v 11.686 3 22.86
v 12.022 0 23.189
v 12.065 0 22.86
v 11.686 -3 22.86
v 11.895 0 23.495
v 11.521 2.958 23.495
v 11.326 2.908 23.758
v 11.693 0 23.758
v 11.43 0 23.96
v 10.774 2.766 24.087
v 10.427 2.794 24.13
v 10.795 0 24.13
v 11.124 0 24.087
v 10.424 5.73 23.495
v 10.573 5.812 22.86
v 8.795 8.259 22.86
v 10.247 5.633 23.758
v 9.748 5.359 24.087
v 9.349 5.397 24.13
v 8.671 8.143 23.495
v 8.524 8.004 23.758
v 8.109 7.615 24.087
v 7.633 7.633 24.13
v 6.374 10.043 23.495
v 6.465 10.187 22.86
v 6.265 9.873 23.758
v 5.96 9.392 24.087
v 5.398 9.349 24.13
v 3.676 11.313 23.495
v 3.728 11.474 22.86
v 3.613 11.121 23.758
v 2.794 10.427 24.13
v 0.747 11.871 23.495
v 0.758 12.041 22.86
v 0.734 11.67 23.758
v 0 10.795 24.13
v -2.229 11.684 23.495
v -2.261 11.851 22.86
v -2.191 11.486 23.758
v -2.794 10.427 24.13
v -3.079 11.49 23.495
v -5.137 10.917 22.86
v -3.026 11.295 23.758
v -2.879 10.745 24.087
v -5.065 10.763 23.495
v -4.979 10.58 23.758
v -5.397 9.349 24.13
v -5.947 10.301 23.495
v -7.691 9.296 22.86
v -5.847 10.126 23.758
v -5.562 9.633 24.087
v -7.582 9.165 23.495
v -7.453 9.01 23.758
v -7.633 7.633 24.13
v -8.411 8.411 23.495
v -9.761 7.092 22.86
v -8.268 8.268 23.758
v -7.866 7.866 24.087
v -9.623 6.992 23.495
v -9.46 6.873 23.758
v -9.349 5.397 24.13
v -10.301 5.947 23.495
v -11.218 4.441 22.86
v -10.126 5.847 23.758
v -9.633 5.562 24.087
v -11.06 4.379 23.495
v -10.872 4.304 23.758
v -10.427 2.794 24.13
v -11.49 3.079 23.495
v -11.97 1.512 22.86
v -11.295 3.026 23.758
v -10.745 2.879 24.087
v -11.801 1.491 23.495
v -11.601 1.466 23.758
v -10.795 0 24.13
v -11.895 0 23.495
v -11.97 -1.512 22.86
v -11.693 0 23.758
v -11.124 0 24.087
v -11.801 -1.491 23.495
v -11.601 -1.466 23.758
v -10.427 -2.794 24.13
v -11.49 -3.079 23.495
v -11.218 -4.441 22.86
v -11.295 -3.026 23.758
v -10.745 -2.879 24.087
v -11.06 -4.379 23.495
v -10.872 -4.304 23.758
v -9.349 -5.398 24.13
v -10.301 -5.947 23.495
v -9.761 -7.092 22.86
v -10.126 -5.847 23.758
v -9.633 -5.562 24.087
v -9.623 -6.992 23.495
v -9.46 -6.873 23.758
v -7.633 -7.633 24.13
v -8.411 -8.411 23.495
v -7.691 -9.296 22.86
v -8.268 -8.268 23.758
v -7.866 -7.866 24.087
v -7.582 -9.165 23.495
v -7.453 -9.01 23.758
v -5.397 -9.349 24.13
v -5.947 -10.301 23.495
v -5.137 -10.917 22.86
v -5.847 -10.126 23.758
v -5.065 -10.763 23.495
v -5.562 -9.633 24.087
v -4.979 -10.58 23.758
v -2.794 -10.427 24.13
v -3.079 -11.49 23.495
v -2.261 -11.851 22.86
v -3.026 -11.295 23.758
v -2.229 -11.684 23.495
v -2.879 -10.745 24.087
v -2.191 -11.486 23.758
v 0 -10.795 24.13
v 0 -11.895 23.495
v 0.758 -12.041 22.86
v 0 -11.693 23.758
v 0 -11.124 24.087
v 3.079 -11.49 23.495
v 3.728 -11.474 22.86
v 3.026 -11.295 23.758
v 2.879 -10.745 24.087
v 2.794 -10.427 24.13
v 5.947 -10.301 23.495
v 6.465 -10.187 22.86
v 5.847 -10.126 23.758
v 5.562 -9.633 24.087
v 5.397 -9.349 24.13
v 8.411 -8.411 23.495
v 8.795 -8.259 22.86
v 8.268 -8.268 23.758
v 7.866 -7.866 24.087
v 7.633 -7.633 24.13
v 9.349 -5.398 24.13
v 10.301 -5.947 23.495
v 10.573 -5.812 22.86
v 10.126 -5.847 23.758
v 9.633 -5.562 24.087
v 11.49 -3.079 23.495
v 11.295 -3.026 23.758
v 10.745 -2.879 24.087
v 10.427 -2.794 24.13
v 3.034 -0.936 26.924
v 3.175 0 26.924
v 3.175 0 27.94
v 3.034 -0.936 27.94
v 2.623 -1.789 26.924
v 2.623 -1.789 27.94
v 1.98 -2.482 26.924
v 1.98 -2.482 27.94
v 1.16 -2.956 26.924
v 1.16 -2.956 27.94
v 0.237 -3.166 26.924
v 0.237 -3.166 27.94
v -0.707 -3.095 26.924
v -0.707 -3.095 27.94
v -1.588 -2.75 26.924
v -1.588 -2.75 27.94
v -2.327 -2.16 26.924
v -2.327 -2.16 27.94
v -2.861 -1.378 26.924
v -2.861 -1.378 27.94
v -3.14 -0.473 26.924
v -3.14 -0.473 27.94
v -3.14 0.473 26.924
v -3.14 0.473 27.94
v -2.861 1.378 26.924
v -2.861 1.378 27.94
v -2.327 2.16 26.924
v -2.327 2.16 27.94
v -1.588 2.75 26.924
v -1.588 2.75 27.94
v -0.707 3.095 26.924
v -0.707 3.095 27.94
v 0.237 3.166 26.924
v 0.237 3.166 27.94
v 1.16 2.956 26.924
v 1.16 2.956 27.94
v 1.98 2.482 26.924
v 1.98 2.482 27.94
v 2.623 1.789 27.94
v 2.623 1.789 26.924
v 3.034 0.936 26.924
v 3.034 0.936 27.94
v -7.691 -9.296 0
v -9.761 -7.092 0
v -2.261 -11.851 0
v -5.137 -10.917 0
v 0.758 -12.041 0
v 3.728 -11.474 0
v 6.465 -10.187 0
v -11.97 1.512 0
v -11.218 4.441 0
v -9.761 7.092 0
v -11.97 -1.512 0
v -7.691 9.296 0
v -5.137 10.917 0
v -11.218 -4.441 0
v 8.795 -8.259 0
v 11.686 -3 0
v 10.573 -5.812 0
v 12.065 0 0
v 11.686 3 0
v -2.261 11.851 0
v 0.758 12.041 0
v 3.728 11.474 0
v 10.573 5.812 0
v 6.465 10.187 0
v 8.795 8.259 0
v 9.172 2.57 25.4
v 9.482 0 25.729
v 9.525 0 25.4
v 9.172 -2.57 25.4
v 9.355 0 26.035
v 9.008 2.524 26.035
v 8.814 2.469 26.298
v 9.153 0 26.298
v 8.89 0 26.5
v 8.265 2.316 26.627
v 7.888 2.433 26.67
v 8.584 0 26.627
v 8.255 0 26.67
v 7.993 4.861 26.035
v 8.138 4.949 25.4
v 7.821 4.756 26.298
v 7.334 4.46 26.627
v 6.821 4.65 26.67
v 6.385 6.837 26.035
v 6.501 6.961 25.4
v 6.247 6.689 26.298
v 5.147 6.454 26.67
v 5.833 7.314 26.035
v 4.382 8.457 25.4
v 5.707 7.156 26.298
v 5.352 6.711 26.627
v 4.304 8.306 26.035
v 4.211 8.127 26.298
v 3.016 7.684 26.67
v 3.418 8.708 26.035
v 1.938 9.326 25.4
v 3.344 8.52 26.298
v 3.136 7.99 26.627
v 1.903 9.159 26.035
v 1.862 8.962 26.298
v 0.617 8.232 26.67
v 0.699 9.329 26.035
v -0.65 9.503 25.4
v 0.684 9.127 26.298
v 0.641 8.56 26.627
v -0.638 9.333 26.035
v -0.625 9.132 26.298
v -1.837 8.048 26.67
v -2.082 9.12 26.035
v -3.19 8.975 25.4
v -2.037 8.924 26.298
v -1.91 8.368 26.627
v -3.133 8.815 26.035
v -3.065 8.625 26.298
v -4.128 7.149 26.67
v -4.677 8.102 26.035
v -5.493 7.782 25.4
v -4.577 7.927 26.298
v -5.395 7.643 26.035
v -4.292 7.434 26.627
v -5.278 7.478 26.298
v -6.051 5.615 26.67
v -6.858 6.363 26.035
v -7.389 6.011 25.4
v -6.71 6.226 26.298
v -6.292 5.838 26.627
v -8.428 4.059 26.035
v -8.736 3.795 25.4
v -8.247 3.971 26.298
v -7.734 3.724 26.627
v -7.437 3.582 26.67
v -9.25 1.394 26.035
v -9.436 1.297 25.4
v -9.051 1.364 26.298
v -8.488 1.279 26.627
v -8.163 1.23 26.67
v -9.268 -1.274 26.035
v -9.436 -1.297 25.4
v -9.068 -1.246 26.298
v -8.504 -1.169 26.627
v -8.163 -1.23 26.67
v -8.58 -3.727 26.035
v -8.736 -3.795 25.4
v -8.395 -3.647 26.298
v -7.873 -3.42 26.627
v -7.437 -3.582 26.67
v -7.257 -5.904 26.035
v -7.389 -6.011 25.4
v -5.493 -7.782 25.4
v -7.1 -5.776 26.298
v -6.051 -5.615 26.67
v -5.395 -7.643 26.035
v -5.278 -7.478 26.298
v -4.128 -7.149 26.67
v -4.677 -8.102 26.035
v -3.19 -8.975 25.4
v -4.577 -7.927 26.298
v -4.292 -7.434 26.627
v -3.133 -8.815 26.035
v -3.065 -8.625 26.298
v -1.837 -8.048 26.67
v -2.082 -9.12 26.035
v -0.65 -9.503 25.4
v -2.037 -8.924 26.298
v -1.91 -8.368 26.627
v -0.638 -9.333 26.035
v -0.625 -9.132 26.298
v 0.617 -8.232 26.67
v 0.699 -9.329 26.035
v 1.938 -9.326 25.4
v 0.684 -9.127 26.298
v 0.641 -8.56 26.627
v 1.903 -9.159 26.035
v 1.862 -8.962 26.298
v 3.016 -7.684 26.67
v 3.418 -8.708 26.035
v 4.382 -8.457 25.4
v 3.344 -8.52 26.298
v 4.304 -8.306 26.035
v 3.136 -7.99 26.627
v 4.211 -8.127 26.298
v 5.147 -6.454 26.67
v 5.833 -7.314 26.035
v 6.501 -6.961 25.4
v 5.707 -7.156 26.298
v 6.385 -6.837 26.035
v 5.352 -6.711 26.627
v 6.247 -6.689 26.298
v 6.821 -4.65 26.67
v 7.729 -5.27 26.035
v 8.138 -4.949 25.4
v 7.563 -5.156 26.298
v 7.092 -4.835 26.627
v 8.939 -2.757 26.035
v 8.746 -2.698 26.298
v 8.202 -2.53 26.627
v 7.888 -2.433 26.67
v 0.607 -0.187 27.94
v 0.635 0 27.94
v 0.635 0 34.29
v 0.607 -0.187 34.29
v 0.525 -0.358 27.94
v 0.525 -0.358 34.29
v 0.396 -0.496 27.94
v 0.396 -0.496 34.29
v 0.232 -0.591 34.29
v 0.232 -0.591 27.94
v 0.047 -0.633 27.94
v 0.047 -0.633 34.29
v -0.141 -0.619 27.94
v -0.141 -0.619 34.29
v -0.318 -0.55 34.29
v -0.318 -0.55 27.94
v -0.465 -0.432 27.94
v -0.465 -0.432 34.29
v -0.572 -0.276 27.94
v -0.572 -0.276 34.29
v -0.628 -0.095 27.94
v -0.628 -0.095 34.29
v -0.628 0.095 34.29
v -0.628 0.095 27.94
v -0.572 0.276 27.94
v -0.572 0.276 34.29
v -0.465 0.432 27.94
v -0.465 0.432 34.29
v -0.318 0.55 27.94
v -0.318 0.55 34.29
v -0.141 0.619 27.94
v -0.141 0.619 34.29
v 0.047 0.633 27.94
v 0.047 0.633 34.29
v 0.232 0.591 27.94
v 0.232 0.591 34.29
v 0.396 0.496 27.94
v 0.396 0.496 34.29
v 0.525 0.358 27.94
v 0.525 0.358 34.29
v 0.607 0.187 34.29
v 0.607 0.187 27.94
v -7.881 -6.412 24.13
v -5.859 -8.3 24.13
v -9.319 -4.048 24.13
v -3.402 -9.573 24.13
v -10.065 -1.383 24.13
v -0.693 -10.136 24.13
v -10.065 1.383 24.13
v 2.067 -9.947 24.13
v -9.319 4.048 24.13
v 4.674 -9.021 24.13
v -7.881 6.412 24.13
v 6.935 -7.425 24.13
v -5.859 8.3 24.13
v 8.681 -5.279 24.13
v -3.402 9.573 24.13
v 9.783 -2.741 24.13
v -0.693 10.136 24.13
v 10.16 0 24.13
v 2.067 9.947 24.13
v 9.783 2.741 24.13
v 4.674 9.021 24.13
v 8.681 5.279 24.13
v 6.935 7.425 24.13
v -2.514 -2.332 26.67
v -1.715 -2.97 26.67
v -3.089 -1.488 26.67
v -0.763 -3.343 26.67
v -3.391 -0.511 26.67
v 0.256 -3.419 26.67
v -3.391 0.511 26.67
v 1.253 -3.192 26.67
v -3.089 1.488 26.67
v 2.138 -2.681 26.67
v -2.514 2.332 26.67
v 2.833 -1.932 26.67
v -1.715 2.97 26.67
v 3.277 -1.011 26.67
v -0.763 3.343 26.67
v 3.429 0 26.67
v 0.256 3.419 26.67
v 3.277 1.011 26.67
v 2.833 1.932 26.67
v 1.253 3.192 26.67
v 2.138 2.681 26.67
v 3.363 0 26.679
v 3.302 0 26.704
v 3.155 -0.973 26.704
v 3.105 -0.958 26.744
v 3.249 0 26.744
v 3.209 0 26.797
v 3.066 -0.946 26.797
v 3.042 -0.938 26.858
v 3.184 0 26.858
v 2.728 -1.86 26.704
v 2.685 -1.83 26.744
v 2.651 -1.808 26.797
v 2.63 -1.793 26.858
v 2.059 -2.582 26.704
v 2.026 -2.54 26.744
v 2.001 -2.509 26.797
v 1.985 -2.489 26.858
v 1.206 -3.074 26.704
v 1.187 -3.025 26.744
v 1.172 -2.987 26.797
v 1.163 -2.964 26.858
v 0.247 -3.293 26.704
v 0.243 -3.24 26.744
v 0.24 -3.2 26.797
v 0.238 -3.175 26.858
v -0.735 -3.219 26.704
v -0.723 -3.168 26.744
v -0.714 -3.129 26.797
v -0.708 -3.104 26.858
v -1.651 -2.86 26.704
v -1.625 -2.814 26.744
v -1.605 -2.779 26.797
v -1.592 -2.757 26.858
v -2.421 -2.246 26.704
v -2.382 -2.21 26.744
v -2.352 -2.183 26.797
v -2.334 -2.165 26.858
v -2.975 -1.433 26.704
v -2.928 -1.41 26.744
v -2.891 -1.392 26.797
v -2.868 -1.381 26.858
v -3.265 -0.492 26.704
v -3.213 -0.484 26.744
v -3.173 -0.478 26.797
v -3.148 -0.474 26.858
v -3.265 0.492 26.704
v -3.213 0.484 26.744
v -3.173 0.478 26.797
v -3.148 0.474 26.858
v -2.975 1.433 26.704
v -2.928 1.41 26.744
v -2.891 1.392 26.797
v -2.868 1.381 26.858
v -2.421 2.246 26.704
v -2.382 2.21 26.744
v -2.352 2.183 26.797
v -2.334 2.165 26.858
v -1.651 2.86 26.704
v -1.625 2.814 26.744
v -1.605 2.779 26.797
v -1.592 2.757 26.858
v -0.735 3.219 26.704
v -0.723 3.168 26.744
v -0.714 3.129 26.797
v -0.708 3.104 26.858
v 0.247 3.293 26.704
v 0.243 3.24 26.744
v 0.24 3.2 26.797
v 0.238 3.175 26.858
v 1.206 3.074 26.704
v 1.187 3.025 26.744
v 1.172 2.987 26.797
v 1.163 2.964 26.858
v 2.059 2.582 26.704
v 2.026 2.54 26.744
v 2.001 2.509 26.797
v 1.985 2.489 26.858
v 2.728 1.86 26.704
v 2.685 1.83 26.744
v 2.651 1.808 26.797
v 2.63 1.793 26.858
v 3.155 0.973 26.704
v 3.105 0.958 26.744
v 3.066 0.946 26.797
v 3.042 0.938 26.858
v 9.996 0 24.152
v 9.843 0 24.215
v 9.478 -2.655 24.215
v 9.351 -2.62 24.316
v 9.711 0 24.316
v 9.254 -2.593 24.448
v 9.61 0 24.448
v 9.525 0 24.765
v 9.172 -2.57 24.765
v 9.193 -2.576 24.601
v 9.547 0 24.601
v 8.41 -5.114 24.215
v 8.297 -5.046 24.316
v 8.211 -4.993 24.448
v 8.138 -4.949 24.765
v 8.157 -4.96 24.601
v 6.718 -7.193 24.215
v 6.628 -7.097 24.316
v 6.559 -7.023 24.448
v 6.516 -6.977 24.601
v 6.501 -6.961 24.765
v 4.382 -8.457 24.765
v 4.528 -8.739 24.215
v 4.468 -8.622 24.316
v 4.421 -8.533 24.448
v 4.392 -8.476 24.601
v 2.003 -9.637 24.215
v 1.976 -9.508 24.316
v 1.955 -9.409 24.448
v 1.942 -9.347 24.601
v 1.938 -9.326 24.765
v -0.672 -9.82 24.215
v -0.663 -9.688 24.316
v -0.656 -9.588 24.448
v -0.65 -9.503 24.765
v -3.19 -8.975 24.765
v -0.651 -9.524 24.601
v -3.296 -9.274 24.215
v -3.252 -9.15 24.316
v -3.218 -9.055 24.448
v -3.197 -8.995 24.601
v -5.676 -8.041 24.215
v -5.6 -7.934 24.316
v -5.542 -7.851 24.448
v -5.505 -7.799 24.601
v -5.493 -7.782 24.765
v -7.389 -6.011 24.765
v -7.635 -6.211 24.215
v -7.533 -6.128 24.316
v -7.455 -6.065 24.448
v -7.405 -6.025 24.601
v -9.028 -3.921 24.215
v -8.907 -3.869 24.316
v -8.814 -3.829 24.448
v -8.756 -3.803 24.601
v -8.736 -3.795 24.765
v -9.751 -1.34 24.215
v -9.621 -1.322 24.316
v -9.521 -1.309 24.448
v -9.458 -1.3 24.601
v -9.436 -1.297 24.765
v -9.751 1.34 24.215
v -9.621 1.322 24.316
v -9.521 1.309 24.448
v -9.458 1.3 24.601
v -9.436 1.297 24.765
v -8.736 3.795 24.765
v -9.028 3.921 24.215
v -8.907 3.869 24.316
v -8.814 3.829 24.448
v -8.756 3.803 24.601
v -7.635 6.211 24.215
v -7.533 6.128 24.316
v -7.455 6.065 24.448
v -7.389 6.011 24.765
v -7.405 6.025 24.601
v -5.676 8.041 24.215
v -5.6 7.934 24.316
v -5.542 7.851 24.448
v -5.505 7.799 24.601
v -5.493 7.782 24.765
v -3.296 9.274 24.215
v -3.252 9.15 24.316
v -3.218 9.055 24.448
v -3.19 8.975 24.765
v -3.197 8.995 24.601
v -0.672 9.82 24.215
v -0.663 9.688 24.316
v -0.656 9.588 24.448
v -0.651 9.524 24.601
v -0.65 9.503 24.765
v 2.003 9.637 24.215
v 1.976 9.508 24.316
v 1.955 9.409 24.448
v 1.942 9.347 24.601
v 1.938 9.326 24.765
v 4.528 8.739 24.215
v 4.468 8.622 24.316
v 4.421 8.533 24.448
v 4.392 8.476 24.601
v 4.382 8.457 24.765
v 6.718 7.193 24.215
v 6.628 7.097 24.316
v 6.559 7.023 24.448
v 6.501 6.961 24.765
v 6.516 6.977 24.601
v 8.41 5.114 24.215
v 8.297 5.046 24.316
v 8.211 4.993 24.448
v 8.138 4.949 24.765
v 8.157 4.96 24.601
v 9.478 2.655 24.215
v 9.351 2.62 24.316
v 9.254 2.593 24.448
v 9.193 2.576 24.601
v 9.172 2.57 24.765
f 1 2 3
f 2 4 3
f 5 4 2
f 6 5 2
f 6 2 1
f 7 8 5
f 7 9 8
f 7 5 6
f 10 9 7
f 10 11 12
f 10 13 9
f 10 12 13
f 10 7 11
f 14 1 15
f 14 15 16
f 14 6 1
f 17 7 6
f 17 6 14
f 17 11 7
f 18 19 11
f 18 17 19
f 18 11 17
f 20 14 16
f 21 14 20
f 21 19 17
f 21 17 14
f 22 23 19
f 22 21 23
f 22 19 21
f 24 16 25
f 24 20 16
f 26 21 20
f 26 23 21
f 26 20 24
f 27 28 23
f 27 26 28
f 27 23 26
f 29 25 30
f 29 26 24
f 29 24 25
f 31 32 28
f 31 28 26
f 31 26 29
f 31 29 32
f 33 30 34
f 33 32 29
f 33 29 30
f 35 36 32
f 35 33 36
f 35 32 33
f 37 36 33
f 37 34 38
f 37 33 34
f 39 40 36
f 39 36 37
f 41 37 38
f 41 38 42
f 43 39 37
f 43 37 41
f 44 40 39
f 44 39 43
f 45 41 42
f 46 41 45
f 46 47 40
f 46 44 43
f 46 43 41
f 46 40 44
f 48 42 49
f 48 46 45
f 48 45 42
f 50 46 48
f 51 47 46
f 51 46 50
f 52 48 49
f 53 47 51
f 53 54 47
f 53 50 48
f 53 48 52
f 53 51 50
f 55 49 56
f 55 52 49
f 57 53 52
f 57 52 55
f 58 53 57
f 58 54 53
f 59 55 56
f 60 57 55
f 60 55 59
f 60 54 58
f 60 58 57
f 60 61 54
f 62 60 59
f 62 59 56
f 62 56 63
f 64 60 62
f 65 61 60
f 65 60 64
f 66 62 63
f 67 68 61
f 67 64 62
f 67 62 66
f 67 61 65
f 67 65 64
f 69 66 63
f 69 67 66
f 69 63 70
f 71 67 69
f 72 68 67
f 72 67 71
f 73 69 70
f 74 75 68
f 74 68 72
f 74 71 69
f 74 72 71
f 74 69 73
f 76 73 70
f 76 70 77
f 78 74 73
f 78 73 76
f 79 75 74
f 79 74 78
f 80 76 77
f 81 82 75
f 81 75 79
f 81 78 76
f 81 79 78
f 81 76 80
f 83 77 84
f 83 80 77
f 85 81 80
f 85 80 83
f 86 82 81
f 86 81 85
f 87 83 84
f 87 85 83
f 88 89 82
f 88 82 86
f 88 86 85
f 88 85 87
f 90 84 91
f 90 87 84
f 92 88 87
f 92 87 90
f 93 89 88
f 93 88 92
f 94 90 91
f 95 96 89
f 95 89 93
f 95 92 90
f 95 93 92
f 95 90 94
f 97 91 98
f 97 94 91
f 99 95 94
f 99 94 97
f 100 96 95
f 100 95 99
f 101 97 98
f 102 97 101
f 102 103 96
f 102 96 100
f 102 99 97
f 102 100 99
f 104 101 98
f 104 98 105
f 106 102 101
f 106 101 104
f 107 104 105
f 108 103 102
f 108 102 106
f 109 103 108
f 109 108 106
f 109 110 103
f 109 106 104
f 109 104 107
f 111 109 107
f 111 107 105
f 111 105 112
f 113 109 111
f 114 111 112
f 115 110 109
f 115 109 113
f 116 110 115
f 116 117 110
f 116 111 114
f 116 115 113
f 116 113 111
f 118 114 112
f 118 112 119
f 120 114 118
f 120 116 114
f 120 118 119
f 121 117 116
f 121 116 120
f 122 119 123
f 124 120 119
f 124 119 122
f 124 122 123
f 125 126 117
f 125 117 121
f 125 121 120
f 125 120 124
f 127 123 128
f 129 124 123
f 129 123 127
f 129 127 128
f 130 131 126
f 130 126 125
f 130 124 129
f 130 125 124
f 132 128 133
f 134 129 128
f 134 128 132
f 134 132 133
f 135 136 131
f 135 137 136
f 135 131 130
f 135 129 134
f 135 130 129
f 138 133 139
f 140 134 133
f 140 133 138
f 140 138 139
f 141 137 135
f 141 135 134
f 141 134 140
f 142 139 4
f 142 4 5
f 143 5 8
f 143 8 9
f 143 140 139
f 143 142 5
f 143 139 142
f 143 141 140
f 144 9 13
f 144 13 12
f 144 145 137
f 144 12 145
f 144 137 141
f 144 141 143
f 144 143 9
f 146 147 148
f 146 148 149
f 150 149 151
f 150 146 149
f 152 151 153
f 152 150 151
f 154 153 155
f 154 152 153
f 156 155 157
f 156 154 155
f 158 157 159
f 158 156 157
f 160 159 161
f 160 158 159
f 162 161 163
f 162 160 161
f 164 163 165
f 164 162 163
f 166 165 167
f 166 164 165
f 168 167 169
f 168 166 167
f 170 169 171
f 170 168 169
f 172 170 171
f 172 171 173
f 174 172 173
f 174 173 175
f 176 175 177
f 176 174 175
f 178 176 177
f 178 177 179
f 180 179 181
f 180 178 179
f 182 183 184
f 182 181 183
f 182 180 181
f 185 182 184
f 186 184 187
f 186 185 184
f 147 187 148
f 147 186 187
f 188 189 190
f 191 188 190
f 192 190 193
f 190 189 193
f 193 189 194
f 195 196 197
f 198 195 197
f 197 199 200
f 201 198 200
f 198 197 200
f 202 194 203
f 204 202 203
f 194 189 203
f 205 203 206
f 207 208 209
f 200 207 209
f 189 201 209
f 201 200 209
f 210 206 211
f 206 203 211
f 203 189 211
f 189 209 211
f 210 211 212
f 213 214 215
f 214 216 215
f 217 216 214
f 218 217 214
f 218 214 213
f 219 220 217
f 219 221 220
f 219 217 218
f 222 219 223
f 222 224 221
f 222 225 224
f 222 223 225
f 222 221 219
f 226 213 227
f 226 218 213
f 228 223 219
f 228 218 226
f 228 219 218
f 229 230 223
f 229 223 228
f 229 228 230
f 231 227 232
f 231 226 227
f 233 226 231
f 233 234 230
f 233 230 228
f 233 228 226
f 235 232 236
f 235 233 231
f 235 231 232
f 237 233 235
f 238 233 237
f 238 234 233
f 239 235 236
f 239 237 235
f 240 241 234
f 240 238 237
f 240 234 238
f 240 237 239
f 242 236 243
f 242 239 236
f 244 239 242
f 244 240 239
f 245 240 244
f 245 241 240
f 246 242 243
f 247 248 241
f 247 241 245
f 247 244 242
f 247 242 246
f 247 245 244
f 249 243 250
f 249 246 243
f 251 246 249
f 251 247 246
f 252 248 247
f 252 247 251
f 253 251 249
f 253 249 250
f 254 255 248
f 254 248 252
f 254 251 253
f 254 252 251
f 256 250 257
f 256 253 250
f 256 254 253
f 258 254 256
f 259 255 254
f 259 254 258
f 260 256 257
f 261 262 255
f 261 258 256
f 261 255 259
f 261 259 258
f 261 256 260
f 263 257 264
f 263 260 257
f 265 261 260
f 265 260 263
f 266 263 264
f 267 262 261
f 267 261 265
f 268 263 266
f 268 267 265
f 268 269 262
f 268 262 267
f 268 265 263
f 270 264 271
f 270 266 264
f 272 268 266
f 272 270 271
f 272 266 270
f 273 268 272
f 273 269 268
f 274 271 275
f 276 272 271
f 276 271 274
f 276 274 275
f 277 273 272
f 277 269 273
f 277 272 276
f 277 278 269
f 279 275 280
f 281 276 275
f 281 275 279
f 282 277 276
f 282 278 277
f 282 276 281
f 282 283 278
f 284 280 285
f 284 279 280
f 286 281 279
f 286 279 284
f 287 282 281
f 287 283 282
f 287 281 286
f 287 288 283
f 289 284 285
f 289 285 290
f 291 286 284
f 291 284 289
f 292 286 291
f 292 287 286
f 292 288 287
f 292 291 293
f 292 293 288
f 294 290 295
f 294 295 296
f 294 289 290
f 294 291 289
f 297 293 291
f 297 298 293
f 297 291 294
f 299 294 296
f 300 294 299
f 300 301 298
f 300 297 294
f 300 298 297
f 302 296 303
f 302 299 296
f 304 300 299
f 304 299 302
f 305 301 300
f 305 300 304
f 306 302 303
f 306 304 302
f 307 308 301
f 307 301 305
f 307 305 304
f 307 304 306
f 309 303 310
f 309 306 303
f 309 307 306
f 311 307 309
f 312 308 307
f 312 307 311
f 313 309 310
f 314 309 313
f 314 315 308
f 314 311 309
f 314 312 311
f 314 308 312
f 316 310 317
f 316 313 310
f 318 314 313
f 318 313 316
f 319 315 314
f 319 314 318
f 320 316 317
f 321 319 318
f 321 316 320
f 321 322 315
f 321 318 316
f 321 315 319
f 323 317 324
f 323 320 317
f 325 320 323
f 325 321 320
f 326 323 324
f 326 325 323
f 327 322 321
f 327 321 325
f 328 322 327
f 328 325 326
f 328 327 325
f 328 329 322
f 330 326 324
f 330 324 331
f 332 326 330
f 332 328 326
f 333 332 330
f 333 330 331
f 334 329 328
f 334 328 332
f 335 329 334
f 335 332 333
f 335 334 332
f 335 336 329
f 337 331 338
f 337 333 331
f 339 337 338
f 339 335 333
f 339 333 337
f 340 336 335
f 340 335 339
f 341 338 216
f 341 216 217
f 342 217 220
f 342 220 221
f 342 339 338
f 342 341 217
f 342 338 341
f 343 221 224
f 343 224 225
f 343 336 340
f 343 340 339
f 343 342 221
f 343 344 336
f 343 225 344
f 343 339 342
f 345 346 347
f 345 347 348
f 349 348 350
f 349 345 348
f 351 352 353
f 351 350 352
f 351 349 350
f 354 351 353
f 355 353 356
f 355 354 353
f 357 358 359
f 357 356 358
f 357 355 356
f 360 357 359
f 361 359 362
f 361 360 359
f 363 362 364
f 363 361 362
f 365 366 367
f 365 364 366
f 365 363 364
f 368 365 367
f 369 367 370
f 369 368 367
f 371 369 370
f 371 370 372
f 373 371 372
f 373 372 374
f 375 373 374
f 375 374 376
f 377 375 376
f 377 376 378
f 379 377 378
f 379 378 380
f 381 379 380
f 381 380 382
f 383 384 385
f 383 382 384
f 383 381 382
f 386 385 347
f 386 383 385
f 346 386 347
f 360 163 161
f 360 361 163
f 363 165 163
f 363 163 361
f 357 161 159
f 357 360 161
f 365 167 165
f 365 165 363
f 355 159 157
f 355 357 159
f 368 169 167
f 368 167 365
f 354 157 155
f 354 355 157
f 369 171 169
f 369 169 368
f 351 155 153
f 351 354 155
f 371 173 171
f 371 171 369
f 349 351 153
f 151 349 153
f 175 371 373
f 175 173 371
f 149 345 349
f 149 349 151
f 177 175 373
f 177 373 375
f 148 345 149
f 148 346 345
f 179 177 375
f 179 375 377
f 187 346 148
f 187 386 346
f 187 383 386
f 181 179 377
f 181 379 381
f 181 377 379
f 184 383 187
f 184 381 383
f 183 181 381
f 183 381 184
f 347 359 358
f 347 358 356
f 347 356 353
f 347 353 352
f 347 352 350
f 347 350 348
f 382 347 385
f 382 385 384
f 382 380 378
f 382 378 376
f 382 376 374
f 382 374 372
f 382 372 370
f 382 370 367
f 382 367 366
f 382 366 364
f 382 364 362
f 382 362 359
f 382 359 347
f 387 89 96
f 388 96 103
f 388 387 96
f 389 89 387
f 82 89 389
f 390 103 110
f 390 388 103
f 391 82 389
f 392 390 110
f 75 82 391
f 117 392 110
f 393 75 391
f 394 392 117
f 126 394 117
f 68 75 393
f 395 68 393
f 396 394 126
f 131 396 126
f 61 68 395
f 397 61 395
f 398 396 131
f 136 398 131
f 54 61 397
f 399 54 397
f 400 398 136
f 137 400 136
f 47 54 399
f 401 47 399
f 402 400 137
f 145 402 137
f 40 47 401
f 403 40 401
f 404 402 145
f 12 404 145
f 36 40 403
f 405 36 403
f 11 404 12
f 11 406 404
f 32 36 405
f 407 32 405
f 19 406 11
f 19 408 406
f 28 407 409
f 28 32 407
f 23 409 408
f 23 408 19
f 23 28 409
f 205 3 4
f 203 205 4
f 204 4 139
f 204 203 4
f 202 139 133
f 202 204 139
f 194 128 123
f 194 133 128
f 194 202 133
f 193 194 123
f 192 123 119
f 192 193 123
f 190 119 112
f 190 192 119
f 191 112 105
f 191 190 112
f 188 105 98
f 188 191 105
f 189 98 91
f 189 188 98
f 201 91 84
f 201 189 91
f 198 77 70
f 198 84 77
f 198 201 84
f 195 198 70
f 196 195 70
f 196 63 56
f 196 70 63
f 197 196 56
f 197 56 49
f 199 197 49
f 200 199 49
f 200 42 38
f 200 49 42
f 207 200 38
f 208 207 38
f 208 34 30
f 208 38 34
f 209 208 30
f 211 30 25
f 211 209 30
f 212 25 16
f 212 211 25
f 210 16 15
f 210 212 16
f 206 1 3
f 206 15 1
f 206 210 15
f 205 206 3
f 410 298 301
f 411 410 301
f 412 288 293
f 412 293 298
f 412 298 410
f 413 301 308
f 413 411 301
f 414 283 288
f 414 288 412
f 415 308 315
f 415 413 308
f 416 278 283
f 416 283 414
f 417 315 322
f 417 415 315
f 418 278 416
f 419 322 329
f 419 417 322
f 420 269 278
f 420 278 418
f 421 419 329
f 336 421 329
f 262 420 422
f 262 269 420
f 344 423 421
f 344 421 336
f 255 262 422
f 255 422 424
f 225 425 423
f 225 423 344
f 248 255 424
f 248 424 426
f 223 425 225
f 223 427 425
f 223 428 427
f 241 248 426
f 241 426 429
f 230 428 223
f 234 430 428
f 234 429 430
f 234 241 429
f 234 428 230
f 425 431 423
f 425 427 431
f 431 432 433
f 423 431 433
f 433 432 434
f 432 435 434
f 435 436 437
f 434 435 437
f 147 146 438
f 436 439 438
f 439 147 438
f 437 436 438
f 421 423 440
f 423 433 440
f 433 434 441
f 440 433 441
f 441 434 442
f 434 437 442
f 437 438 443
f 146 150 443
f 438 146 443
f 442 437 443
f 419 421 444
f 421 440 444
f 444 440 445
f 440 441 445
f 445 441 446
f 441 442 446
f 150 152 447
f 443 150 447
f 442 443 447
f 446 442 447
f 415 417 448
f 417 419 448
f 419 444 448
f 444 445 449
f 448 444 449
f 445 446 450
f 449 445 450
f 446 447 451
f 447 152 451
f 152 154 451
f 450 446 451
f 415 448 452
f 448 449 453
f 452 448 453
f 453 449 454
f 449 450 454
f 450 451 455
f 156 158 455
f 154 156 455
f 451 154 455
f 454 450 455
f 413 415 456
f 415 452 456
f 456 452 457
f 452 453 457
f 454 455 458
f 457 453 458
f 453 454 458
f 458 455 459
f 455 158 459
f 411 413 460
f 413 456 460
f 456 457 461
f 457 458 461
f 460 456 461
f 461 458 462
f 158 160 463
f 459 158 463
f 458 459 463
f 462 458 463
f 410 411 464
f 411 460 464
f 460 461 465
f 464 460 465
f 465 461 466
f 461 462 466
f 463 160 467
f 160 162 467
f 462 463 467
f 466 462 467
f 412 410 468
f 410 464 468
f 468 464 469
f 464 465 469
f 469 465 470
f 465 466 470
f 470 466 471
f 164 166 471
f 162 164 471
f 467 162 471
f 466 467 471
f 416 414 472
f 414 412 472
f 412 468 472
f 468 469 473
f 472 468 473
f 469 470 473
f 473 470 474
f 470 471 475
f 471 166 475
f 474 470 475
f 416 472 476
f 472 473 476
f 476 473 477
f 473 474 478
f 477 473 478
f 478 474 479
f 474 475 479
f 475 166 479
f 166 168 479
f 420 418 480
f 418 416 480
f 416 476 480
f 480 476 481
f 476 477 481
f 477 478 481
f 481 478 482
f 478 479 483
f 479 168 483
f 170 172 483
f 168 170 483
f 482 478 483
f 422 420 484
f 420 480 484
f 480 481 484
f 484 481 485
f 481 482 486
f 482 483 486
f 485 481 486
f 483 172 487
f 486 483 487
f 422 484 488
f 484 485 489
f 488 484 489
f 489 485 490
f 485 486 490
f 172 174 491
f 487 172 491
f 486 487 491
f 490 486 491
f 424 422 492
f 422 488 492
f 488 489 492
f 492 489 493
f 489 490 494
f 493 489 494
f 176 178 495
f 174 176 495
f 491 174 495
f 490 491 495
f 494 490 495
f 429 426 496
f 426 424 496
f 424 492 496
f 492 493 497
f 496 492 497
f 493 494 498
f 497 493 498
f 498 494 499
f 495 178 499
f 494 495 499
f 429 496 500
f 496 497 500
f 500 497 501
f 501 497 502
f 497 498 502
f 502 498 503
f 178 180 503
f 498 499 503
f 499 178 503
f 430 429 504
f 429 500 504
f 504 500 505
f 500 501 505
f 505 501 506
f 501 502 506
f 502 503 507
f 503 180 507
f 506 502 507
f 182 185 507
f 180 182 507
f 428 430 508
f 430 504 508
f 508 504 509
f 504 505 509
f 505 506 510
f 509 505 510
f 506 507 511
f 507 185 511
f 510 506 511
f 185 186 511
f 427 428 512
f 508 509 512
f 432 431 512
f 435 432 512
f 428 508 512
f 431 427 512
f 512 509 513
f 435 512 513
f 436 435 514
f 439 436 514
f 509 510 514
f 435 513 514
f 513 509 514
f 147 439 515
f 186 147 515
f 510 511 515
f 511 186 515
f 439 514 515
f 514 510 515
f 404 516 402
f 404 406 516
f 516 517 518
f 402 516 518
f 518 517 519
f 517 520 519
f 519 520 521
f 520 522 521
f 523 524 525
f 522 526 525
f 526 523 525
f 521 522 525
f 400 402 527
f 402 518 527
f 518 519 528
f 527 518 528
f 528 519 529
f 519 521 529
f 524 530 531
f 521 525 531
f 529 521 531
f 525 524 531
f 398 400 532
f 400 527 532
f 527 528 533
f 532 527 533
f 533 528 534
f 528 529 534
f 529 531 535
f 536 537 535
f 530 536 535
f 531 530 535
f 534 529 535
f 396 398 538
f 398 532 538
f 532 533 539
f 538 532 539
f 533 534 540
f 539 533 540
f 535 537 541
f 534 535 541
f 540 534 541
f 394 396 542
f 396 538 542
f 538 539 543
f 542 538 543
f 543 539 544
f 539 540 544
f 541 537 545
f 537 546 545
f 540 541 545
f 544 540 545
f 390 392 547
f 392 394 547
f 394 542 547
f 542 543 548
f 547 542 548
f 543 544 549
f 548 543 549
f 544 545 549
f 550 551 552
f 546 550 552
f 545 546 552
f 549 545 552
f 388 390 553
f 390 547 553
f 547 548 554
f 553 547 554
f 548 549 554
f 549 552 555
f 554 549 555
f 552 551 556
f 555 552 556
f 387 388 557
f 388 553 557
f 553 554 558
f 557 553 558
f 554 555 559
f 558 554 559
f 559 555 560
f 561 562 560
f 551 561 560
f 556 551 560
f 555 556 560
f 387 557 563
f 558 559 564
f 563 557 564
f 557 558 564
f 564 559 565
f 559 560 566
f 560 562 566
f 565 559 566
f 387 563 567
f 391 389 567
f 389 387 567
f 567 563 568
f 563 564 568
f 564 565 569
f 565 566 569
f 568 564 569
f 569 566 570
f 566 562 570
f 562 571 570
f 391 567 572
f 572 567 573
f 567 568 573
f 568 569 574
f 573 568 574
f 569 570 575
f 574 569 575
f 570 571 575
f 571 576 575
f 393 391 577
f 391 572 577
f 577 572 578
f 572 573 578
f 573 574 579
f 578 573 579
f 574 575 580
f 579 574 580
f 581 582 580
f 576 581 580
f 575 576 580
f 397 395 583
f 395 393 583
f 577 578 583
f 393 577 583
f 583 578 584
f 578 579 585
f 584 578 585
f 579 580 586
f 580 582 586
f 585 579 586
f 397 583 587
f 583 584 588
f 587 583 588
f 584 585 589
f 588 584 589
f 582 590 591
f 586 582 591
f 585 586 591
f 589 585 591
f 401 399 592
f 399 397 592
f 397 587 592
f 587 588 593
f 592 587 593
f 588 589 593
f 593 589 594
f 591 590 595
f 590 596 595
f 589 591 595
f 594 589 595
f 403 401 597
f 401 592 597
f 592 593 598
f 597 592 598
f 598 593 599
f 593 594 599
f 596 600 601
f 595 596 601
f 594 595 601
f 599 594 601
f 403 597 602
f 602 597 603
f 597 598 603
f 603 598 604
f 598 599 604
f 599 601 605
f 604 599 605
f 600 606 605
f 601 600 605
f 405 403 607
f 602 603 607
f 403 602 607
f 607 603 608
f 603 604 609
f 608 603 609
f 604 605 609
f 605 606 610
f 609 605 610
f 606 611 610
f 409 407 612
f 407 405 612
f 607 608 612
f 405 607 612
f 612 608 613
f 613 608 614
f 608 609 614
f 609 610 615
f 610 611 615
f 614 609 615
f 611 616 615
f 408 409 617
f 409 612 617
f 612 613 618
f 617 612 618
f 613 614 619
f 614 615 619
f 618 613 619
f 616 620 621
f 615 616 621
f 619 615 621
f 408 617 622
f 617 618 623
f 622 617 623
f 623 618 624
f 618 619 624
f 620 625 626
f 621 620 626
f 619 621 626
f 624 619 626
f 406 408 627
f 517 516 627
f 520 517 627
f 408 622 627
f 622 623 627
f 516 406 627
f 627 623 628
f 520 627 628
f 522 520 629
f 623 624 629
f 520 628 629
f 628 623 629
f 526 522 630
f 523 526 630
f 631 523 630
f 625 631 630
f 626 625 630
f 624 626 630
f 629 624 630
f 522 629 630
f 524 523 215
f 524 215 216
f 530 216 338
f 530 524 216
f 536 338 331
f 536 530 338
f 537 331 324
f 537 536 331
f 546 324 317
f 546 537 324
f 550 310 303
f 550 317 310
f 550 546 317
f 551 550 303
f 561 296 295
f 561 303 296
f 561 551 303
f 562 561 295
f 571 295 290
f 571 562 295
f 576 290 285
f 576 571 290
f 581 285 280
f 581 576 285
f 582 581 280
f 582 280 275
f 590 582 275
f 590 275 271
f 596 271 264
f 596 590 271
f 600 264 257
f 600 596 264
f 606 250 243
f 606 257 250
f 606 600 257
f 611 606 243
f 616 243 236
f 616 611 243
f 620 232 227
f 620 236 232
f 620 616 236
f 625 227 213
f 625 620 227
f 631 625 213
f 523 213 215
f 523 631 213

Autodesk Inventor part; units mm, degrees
ref_plane "YZ Plane" through (0, 0, 0) normal (1, 0, 0) x (0, 1, 0)
ref_plane "XZ Plane" through (0, 0, 0) normal (0, 1, 0) x (-1, 0, 0)
ref_plane "XY Plane" through (0, 0, 0) normal (0, 0, 1) x (1, 0, 0)
sketch "Sketch1" plane through (0, 0, 0) normal (0, 0, 1) x (1, 0, 0)
  circle A0 centre (0, 0) radius 12.065
  dimension "d0" = 24.13
extrude "Extrusion1" add sketch "Sketch1" along normal blind 24.13
sketch "Sketch2" plane through (0, 0, 24.13) normal (0, 0, 1) x (1, 0, 0)
  circle A0 centre (0, 0) radius 12.065 projected
  circle A1 centre (0, 0) radius 9.525
  dimension "d4" = 19.05
extrude "Extrusion2" add sketch "Sketch2" along normal blind 2.54 contours A1
sketch "Sketch3" plane through (0, 0, 26.67) normal (0, 0, 1) x (1, 0, 0)
  circle A0 centre (0, 0) radius 9.525 projected
  circle A1 centre (0, 0) radius 3.175
  dimension "d8" = 6.35
extrude "Extrusion3" add sketch "Sketch3" along normal blind 1.27 contours A1
sketch "Sketch4" plane through (0, 0, 27.94) normal (0, 0, 1) x (1, 0, 0)
  circle A0 centre (0, 0) radius 3.175 projected
  circle A1 centre (0, 0) radius 0.635
  dimension "d12" = 1.27
extrude "Extrusion4" add sketch "Sketch4" along normal blind 6.35 contours A1
fillet "Fillet1" radius 1.27 2 edges at (-12.065, 0, 24.13) (-9.525, 0, 26.67)
fillet "Fillet2" radius 0.635 1 edges at (-9.525, 0, 24.13)
fillet "Fillet3" radius 0.254 1 edges at (-3.175, 0, 26.67)
properties part number "Motor"
